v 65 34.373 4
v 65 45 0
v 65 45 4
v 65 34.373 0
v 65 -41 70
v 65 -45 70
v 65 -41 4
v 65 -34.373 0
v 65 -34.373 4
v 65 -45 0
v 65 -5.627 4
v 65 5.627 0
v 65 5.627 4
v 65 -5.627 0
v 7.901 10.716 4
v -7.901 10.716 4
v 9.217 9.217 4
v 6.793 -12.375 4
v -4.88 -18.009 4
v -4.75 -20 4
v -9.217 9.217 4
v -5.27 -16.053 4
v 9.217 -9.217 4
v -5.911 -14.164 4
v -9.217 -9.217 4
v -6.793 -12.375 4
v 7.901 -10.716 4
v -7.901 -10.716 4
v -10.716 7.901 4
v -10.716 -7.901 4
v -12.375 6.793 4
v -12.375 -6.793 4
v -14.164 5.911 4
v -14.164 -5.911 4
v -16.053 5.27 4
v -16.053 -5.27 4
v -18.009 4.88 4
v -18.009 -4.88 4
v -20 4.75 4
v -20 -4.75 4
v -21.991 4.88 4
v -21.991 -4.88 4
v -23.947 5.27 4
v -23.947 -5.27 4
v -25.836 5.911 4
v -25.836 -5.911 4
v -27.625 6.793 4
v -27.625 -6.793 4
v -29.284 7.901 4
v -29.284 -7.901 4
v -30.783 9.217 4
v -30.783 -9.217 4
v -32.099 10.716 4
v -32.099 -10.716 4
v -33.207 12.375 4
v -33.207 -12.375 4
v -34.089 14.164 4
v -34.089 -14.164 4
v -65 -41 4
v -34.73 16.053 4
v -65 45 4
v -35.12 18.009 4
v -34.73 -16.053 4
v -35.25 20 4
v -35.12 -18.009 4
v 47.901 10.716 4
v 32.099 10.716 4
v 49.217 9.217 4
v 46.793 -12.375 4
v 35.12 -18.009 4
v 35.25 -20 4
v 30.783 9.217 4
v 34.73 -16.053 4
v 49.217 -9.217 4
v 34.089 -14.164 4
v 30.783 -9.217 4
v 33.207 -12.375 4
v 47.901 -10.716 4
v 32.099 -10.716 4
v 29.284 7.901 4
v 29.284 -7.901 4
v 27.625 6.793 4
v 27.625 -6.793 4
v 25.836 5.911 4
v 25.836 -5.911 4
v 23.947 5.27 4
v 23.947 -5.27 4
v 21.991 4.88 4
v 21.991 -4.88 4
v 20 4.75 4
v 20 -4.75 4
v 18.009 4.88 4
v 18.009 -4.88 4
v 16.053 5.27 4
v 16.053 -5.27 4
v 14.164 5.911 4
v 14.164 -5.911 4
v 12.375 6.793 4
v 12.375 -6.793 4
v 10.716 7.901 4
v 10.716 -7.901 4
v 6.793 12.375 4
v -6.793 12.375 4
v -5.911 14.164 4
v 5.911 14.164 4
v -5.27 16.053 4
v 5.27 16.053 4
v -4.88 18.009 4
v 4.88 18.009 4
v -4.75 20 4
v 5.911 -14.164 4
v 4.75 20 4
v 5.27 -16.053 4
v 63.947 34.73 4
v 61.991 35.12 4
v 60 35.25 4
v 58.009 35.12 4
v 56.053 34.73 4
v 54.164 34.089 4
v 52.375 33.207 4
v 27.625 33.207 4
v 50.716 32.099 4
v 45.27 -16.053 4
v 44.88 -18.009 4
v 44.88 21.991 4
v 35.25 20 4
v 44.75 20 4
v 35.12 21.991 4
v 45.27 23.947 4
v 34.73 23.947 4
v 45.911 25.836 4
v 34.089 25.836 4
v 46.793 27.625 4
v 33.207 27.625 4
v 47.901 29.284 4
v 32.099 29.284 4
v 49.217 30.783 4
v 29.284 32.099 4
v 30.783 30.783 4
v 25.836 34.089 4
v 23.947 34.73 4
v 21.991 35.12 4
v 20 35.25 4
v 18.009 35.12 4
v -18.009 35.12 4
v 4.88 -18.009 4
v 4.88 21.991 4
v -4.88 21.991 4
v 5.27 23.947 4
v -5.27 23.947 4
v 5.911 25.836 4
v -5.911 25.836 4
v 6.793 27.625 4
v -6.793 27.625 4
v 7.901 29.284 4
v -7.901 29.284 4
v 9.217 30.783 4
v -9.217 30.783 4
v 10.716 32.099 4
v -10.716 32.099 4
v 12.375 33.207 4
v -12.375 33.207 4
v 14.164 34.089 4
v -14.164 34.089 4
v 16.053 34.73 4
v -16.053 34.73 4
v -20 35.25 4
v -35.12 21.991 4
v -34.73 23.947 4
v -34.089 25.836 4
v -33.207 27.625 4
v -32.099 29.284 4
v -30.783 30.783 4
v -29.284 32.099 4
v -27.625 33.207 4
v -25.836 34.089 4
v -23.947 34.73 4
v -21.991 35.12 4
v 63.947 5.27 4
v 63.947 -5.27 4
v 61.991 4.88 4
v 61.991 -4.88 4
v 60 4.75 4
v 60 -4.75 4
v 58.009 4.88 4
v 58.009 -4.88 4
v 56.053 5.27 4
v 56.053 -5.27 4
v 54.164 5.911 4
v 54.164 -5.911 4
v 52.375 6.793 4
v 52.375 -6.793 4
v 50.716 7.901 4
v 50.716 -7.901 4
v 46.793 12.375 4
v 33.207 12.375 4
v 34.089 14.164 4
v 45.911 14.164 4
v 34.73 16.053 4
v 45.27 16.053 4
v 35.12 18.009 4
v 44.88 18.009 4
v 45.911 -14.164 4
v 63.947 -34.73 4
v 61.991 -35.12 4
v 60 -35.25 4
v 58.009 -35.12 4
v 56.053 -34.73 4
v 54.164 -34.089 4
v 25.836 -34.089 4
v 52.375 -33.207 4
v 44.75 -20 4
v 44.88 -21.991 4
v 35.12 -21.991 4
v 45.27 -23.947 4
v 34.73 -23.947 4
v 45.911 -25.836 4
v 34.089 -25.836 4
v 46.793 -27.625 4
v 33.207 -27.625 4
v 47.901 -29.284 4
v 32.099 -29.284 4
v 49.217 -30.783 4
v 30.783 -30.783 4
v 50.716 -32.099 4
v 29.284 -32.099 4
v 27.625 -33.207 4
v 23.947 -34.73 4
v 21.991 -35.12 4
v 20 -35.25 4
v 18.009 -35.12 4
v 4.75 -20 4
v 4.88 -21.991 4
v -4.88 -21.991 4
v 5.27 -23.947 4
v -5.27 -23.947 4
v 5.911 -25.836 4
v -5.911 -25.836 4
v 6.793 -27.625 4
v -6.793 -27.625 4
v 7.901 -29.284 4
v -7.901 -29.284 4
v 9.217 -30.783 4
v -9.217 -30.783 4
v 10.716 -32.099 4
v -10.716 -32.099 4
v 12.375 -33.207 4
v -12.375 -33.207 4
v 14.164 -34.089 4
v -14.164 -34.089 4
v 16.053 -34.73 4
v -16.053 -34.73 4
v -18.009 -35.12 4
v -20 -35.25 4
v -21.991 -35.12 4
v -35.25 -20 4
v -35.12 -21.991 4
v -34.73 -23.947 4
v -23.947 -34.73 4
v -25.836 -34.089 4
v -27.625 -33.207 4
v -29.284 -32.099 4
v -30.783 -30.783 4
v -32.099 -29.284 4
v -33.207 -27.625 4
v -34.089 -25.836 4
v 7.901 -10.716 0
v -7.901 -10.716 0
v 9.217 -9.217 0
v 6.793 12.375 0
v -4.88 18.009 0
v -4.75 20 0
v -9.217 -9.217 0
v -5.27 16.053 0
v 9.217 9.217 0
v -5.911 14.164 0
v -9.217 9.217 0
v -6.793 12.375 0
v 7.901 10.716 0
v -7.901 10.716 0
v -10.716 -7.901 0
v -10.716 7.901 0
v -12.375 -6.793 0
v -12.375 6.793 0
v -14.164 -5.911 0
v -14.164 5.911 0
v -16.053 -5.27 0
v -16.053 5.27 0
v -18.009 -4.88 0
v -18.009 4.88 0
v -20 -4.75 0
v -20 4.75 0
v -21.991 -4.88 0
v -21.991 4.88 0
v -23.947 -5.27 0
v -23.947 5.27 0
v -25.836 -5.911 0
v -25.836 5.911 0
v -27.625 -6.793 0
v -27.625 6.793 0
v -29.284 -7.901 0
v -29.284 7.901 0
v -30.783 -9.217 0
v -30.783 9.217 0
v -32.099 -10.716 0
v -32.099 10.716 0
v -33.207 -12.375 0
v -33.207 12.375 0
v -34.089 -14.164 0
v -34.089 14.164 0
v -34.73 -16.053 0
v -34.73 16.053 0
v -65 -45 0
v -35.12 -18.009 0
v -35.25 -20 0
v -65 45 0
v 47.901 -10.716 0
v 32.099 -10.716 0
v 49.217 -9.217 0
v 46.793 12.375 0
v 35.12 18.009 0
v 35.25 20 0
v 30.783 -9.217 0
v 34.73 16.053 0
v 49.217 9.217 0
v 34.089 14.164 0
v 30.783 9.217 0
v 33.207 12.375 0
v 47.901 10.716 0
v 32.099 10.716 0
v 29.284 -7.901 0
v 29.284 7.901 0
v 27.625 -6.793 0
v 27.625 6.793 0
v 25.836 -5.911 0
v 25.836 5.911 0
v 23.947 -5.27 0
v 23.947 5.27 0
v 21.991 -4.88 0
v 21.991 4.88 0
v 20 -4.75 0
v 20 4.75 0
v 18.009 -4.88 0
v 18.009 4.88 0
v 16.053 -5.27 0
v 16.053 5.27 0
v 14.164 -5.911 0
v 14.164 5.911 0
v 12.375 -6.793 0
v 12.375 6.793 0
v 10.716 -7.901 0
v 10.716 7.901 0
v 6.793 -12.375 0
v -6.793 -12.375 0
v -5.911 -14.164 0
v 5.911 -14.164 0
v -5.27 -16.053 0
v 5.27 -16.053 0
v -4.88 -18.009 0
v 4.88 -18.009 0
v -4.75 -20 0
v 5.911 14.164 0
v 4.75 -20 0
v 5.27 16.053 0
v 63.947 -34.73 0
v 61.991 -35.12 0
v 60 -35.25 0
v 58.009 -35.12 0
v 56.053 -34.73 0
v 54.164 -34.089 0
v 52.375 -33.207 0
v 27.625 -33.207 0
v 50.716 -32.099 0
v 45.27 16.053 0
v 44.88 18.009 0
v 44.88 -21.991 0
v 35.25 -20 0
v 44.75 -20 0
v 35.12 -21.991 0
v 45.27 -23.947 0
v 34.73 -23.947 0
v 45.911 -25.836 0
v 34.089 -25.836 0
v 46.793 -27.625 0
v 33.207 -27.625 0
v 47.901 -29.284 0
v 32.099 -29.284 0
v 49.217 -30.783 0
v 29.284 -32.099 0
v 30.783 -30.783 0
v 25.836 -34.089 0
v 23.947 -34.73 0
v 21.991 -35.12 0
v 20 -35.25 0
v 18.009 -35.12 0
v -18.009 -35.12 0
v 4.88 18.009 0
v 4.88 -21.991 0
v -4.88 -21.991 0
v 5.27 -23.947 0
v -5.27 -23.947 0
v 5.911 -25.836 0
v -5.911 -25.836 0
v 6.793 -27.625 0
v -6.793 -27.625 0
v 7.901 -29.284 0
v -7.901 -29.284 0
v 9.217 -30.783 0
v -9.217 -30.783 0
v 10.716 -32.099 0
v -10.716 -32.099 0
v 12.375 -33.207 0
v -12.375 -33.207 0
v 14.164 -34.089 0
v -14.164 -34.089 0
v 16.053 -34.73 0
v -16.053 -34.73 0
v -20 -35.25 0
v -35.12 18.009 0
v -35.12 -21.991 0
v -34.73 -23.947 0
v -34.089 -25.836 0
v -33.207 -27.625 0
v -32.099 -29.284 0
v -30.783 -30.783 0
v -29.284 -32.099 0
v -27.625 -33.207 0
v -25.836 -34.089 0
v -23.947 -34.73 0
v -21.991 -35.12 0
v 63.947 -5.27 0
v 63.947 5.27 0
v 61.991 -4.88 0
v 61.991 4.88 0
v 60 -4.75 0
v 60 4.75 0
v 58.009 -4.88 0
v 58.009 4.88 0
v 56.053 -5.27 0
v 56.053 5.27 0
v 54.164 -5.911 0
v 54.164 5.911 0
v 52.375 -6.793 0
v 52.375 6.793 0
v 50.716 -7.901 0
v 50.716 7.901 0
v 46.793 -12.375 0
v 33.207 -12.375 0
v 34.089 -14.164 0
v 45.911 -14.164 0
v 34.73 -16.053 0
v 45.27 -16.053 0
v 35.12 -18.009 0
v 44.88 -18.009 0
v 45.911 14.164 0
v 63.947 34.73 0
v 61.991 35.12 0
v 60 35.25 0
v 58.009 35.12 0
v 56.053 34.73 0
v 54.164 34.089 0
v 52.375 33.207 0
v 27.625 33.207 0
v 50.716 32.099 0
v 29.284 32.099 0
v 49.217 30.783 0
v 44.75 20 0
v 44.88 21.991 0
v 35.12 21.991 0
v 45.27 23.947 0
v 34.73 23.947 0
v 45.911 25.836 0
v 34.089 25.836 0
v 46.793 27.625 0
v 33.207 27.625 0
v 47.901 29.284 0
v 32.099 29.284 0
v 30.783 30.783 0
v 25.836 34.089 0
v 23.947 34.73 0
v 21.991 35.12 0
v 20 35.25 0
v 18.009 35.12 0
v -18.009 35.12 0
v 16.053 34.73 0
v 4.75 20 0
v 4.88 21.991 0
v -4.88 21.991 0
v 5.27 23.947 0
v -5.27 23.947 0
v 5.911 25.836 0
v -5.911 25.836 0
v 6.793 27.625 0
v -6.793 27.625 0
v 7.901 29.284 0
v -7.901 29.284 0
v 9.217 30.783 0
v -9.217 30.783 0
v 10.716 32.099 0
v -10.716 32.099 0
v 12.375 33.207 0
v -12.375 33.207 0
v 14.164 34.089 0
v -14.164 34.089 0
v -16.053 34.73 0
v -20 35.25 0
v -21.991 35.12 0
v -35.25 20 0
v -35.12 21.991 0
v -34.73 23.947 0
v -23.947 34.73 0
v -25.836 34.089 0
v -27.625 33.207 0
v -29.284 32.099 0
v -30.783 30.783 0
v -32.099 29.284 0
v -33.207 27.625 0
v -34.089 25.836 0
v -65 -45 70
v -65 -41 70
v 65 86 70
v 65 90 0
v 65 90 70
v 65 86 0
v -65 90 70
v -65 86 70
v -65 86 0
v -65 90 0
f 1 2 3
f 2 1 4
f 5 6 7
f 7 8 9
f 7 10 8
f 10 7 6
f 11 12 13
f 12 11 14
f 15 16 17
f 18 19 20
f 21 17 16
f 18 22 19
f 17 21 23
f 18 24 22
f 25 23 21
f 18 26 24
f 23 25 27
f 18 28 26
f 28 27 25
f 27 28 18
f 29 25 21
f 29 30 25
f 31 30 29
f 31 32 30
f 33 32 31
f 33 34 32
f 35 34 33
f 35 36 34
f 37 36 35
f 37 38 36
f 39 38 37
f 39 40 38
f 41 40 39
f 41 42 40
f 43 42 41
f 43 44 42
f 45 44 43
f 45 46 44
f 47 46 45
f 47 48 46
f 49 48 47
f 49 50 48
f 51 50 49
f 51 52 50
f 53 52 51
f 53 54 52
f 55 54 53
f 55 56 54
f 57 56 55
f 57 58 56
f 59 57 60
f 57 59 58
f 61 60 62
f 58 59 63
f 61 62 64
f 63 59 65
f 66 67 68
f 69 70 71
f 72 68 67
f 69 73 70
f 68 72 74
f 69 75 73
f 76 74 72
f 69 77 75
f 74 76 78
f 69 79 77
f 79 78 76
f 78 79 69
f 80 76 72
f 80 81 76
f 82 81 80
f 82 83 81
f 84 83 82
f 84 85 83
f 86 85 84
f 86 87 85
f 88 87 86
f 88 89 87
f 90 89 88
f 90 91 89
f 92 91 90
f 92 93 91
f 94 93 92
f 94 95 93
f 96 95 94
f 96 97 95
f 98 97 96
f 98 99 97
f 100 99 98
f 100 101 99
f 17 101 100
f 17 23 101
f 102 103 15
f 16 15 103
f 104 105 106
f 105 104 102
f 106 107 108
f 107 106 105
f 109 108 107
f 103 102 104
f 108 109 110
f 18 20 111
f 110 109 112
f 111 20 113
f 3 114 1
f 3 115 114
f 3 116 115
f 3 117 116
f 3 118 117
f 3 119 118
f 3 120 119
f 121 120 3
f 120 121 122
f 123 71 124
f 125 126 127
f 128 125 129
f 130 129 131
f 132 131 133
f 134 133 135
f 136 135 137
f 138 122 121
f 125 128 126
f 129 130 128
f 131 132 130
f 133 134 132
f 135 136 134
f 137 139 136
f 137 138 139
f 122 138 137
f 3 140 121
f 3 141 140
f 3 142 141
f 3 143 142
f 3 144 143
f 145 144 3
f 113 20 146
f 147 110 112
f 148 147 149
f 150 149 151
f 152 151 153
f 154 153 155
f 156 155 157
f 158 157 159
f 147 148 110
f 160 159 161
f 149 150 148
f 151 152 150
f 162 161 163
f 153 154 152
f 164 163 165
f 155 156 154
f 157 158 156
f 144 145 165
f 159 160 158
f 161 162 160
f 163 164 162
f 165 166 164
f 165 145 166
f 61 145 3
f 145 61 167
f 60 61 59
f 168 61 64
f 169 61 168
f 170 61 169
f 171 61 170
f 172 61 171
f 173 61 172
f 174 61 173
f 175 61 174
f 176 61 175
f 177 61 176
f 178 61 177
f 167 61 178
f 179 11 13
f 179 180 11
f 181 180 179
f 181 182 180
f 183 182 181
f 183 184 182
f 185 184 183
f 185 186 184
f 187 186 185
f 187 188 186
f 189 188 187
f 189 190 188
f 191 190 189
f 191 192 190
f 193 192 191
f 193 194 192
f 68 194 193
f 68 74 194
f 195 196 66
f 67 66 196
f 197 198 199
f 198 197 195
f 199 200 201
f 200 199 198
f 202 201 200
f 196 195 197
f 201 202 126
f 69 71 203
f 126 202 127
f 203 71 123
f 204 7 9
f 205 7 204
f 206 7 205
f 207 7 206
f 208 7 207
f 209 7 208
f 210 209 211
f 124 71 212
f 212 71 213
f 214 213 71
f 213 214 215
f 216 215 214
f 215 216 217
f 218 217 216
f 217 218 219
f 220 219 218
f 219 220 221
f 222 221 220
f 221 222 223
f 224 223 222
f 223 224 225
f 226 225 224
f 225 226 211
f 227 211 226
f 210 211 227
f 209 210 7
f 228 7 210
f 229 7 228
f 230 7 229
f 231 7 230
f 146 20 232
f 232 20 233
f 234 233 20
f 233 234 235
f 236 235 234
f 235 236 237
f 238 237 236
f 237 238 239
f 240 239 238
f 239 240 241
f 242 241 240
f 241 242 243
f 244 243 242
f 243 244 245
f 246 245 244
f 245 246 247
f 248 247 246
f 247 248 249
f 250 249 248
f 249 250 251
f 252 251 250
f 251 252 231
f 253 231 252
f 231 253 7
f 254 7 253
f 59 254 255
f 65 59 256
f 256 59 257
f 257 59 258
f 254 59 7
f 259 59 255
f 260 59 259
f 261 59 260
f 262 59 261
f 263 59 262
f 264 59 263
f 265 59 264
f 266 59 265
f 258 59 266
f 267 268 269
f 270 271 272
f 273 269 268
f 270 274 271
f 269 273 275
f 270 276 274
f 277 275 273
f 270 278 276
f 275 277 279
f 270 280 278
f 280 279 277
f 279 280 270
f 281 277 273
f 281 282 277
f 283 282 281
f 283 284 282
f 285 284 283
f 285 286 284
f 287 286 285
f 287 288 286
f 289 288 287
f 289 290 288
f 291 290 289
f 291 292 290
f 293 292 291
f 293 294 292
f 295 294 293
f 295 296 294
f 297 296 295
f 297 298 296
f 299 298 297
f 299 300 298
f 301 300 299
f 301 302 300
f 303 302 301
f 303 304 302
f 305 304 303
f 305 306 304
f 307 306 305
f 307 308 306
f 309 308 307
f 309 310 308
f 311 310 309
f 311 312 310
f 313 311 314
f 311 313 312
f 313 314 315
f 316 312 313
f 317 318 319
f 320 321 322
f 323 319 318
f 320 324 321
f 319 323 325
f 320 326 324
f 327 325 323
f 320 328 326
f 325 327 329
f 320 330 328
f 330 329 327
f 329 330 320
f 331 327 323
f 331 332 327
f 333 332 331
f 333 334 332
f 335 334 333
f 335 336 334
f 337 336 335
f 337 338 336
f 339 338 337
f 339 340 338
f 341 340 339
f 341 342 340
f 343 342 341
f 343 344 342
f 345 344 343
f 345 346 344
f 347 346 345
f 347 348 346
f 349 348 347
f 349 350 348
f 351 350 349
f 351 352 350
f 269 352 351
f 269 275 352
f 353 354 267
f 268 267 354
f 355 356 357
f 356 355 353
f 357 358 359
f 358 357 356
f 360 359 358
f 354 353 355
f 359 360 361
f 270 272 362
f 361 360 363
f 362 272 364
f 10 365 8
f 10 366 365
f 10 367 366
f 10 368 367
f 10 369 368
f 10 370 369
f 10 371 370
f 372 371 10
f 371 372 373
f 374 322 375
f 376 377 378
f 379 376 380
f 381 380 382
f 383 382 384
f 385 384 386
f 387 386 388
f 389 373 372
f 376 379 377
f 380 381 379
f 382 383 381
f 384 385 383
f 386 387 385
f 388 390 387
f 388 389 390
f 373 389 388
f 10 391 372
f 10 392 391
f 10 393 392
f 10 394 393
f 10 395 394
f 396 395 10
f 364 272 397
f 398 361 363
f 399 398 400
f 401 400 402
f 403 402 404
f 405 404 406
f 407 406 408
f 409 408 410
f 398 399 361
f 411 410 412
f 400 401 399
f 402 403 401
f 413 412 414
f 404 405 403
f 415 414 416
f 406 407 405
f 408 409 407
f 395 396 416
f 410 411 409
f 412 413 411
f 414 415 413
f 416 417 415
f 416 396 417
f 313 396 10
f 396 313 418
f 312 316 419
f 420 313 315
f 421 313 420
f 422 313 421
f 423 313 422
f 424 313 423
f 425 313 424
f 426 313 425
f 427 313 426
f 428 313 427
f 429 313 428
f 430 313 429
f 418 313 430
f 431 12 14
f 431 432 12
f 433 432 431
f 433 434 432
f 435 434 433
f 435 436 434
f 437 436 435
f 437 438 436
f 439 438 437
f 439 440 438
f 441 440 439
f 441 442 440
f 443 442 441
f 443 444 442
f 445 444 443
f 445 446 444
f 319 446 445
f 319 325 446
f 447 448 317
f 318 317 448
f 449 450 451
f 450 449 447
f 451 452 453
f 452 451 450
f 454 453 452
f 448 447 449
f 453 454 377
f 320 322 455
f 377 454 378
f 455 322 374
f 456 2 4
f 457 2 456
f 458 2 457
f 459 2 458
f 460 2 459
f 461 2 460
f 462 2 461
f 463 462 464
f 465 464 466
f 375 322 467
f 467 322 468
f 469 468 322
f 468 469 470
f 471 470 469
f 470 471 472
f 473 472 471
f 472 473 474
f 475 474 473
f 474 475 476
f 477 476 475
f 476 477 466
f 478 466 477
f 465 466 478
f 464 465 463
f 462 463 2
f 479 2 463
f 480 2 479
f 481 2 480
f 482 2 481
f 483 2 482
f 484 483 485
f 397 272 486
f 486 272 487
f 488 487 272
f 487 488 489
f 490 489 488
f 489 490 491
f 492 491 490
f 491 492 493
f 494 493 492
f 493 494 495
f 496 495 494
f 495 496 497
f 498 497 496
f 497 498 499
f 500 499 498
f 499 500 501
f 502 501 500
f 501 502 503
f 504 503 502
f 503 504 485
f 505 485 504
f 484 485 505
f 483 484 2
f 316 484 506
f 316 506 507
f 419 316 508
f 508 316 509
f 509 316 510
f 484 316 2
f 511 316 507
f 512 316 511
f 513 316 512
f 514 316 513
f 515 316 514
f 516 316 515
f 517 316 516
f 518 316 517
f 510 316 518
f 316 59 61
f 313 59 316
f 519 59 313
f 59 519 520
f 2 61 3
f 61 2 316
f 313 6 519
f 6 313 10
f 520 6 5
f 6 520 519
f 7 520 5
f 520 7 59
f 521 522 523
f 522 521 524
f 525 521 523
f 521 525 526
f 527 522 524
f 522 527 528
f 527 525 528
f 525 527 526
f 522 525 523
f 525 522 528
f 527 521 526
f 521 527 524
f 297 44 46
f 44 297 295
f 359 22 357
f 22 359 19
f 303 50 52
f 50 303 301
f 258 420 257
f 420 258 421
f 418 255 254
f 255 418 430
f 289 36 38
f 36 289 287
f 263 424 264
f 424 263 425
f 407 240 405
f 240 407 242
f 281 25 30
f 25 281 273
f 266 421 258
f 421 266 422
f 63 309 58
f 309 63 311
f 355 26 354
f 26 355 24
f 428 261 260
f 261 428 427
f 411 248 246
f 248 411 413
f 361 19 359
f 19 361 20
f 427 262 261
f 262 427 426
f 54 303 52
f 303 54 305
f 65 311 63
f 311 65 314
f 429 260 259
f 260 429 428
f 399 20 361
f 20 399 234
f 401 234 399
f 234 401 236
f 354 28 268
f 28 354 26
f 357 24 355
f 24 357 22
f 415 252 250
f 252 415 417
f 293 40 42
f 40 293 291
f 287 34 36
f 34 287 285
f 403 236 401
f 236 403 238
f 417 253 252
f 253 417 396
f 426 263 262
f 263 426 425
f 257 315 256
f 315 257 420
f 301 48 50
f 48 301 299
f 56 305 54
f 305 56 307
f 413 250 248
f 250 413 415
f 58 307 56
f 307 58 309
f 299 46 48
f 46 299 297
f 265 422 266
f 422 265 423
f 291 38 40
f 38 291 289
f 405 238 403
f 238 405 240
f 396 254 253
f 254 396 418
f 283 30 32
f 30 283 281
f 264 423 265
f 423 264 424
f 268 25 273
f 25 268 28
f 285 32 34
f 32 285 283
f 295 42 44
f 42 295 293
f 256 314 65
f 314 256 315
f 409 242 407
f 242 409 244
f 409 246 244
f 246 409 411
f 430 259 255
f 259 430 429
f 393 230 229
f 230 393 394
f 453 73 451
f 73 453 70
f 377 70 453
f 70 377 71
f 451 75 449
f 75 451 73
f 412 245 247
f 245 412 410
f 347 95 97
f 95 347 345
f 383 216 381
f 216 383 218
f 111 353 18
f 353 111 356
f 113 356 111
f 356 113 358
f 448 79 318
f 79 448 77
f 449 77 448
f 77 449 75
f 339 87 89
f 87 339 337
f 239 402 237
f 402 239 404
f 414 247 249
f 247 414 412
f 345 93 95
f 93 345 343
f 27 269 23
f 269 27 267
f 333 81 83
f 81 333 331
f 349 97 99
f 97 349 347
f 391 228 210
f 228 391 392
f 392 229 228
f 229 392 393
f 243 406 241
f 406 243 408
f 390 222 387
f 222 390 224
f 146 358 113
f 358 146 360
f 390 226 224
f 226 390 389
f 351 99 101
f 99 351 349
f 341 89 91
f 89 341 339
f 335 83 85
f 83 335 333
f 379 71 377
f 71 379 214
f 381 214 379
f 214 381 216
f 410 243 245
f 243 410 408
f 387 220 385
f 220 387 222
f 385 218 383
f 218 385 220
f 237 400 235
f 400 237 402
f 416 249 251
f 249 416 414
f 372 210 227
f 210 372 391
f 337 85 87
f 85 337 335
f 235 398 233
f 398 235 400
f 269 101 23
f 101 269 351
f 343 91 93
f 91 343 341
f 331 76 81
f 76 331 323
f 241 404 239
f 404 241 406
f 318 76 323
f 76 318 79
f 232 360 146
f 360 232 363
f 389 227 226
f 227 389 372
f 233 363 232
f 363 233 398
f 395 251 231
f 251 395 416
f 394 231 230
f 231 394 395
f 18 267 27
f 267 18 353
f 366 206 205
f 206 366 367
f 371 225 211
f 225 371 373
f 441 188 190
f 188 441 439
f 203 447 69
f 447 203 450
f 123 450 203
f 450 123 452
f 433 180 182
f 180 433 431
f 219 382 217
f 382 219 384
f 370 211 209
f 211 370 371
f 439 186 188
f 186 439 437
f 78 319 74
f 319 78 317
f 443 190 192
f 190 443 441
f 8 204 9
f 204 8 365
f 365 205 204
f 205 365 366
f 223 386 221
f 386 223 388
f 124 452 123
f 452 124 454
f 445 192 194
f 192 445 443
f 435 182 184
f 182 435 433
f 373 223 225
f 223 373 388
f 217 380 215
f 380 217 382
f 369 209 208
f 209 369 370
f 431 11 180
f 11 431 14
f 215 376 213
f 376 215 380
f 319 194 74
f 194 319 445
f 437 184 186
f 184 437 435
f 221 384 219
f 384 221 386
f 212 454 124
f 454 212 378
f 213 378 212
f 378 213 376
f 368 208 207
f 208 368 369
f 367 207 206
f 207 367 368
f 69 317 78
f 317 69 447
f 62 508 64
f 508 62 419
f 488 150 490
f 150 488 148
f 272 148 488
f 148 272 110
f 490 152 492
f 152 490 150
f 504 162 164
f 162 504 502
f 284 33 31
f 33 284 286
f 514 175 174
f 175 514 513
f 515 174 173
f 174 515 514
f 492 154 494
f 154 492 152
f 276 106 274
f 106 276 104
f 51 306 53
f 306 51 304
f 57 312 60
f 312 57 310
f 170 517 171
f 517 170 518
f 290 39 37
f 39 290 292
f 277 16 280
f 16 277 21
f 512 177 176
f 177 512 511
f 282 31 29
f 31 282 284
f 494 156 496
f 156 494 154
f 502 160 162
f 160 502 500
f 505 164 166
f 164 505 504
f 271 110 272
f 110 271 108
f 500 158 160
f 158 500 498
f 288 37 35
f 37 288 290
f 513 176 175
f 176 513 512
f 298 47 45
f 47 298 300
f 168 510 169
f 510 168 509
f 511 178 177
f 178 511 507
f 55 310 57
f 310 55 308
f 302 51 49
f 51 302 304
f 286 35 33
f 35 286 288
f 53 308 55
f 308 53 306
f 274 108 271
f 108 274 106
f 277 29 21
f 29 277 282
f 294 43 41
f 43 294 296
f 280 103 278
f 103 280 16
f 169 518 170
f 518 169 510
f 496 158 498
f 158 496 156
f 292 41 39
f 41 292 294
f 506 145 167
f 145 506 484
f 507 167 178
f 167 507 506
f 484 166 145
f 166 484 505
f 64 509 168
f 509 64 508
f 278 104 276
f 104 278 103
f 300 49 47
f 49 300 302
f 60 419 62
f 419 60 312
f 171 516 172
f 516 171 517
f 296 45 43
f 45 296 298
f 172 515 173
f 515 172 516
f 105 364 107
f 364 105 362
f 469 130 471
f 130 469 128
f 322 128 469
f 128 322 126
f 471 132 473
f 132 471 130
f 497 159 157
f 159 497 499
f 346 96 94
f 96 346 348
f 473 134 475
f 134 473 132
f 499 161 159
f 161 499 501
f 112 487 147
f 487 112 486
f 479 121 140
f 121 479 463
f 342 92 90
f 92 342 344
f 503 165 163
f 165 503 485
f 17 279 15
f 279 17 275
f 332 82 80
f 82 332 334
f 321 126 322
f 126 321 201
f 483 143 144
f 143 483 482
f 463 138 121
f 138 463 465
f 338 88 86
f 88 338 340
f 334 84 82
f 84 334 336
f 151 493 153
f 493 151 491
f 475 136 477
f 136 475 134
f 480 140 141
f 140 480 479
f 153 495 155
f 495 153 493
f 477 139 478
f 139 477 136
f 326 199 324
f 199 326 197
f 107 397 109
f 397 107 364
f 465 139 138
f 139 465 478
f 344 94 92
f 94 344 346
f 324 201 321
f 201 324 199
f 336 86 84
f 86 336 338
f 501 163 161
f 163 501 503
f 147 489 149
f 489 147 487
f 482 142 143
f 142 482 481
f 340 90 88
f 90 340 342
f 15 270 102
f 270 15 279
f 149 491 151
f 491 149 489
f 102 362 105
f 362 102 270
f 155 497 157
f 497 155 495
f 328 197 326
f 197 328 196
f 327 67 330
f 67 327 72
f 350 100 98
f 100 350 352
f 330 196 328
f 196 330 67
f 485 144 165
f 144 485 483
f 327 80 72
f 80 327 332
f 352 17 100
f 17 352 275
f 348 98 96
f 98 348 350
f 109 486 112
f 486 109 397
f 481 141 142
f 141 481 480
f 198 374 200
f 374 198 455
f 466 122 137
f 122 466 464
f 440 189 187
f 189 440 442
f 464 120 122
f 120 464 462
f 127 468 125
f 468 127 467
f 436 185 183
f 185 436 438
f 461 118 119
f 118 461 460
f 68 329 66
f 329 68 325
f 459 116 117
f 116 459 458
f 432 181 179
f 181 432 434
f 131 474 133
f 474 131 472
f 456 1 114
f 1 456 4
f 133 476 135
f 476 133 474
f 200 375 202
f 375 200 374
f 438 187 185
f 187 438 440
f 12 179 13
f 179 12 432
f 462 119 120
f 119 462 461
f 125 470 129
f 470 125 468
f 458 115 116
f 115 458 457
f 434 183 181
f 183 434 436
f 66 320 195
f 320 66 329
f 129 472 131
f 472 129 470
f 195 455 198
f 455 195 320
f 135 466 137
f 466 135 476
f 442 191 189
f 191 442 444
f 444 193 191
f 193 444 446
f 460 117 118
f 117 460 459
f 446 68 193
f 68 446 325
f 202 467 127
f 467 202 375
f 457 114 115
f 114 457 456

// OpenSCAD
// Tube rack for six 50 mL conical (Falcon-type) tubes - printed upside down and flipped over.
// A flat plate with a 2x3 hole grid and two solid walls runs along the long edges. The two
// short ends stay open. After flipping, the rack stands on the walls and the tubes pass
// through the holes.
//

plate_x = 130;
plate_y = 90;
plate_z = 4;
wall_h  = 70;
hole_d  = 30.5;
row_p   = 40;
col_p   = 40;

$fn = 48;

wall_t = 4;

difference() {
    union() {
        translate([-plate_x / 2, -plate_y / 2, 0]) cube([plate_x, plate_y, plate_z]);
        translate([-plate_x / 2, -plate_y / 2, 0]) cube([plate_x, wall_t, wall_h]);      // left wall
        translate([-plate_x / 2, plate_y - wall_t, 0]) cube([plate_x, wall_t, wall_h]);  // right wall
    }
    for (i = [0 : 1], j = [0 : 2])
        translate([col_p * j - row_p / 2, row_p * i - col_p / 2, -1])
            cylinder(h = plate_z + 2, d = hole_d);
}
